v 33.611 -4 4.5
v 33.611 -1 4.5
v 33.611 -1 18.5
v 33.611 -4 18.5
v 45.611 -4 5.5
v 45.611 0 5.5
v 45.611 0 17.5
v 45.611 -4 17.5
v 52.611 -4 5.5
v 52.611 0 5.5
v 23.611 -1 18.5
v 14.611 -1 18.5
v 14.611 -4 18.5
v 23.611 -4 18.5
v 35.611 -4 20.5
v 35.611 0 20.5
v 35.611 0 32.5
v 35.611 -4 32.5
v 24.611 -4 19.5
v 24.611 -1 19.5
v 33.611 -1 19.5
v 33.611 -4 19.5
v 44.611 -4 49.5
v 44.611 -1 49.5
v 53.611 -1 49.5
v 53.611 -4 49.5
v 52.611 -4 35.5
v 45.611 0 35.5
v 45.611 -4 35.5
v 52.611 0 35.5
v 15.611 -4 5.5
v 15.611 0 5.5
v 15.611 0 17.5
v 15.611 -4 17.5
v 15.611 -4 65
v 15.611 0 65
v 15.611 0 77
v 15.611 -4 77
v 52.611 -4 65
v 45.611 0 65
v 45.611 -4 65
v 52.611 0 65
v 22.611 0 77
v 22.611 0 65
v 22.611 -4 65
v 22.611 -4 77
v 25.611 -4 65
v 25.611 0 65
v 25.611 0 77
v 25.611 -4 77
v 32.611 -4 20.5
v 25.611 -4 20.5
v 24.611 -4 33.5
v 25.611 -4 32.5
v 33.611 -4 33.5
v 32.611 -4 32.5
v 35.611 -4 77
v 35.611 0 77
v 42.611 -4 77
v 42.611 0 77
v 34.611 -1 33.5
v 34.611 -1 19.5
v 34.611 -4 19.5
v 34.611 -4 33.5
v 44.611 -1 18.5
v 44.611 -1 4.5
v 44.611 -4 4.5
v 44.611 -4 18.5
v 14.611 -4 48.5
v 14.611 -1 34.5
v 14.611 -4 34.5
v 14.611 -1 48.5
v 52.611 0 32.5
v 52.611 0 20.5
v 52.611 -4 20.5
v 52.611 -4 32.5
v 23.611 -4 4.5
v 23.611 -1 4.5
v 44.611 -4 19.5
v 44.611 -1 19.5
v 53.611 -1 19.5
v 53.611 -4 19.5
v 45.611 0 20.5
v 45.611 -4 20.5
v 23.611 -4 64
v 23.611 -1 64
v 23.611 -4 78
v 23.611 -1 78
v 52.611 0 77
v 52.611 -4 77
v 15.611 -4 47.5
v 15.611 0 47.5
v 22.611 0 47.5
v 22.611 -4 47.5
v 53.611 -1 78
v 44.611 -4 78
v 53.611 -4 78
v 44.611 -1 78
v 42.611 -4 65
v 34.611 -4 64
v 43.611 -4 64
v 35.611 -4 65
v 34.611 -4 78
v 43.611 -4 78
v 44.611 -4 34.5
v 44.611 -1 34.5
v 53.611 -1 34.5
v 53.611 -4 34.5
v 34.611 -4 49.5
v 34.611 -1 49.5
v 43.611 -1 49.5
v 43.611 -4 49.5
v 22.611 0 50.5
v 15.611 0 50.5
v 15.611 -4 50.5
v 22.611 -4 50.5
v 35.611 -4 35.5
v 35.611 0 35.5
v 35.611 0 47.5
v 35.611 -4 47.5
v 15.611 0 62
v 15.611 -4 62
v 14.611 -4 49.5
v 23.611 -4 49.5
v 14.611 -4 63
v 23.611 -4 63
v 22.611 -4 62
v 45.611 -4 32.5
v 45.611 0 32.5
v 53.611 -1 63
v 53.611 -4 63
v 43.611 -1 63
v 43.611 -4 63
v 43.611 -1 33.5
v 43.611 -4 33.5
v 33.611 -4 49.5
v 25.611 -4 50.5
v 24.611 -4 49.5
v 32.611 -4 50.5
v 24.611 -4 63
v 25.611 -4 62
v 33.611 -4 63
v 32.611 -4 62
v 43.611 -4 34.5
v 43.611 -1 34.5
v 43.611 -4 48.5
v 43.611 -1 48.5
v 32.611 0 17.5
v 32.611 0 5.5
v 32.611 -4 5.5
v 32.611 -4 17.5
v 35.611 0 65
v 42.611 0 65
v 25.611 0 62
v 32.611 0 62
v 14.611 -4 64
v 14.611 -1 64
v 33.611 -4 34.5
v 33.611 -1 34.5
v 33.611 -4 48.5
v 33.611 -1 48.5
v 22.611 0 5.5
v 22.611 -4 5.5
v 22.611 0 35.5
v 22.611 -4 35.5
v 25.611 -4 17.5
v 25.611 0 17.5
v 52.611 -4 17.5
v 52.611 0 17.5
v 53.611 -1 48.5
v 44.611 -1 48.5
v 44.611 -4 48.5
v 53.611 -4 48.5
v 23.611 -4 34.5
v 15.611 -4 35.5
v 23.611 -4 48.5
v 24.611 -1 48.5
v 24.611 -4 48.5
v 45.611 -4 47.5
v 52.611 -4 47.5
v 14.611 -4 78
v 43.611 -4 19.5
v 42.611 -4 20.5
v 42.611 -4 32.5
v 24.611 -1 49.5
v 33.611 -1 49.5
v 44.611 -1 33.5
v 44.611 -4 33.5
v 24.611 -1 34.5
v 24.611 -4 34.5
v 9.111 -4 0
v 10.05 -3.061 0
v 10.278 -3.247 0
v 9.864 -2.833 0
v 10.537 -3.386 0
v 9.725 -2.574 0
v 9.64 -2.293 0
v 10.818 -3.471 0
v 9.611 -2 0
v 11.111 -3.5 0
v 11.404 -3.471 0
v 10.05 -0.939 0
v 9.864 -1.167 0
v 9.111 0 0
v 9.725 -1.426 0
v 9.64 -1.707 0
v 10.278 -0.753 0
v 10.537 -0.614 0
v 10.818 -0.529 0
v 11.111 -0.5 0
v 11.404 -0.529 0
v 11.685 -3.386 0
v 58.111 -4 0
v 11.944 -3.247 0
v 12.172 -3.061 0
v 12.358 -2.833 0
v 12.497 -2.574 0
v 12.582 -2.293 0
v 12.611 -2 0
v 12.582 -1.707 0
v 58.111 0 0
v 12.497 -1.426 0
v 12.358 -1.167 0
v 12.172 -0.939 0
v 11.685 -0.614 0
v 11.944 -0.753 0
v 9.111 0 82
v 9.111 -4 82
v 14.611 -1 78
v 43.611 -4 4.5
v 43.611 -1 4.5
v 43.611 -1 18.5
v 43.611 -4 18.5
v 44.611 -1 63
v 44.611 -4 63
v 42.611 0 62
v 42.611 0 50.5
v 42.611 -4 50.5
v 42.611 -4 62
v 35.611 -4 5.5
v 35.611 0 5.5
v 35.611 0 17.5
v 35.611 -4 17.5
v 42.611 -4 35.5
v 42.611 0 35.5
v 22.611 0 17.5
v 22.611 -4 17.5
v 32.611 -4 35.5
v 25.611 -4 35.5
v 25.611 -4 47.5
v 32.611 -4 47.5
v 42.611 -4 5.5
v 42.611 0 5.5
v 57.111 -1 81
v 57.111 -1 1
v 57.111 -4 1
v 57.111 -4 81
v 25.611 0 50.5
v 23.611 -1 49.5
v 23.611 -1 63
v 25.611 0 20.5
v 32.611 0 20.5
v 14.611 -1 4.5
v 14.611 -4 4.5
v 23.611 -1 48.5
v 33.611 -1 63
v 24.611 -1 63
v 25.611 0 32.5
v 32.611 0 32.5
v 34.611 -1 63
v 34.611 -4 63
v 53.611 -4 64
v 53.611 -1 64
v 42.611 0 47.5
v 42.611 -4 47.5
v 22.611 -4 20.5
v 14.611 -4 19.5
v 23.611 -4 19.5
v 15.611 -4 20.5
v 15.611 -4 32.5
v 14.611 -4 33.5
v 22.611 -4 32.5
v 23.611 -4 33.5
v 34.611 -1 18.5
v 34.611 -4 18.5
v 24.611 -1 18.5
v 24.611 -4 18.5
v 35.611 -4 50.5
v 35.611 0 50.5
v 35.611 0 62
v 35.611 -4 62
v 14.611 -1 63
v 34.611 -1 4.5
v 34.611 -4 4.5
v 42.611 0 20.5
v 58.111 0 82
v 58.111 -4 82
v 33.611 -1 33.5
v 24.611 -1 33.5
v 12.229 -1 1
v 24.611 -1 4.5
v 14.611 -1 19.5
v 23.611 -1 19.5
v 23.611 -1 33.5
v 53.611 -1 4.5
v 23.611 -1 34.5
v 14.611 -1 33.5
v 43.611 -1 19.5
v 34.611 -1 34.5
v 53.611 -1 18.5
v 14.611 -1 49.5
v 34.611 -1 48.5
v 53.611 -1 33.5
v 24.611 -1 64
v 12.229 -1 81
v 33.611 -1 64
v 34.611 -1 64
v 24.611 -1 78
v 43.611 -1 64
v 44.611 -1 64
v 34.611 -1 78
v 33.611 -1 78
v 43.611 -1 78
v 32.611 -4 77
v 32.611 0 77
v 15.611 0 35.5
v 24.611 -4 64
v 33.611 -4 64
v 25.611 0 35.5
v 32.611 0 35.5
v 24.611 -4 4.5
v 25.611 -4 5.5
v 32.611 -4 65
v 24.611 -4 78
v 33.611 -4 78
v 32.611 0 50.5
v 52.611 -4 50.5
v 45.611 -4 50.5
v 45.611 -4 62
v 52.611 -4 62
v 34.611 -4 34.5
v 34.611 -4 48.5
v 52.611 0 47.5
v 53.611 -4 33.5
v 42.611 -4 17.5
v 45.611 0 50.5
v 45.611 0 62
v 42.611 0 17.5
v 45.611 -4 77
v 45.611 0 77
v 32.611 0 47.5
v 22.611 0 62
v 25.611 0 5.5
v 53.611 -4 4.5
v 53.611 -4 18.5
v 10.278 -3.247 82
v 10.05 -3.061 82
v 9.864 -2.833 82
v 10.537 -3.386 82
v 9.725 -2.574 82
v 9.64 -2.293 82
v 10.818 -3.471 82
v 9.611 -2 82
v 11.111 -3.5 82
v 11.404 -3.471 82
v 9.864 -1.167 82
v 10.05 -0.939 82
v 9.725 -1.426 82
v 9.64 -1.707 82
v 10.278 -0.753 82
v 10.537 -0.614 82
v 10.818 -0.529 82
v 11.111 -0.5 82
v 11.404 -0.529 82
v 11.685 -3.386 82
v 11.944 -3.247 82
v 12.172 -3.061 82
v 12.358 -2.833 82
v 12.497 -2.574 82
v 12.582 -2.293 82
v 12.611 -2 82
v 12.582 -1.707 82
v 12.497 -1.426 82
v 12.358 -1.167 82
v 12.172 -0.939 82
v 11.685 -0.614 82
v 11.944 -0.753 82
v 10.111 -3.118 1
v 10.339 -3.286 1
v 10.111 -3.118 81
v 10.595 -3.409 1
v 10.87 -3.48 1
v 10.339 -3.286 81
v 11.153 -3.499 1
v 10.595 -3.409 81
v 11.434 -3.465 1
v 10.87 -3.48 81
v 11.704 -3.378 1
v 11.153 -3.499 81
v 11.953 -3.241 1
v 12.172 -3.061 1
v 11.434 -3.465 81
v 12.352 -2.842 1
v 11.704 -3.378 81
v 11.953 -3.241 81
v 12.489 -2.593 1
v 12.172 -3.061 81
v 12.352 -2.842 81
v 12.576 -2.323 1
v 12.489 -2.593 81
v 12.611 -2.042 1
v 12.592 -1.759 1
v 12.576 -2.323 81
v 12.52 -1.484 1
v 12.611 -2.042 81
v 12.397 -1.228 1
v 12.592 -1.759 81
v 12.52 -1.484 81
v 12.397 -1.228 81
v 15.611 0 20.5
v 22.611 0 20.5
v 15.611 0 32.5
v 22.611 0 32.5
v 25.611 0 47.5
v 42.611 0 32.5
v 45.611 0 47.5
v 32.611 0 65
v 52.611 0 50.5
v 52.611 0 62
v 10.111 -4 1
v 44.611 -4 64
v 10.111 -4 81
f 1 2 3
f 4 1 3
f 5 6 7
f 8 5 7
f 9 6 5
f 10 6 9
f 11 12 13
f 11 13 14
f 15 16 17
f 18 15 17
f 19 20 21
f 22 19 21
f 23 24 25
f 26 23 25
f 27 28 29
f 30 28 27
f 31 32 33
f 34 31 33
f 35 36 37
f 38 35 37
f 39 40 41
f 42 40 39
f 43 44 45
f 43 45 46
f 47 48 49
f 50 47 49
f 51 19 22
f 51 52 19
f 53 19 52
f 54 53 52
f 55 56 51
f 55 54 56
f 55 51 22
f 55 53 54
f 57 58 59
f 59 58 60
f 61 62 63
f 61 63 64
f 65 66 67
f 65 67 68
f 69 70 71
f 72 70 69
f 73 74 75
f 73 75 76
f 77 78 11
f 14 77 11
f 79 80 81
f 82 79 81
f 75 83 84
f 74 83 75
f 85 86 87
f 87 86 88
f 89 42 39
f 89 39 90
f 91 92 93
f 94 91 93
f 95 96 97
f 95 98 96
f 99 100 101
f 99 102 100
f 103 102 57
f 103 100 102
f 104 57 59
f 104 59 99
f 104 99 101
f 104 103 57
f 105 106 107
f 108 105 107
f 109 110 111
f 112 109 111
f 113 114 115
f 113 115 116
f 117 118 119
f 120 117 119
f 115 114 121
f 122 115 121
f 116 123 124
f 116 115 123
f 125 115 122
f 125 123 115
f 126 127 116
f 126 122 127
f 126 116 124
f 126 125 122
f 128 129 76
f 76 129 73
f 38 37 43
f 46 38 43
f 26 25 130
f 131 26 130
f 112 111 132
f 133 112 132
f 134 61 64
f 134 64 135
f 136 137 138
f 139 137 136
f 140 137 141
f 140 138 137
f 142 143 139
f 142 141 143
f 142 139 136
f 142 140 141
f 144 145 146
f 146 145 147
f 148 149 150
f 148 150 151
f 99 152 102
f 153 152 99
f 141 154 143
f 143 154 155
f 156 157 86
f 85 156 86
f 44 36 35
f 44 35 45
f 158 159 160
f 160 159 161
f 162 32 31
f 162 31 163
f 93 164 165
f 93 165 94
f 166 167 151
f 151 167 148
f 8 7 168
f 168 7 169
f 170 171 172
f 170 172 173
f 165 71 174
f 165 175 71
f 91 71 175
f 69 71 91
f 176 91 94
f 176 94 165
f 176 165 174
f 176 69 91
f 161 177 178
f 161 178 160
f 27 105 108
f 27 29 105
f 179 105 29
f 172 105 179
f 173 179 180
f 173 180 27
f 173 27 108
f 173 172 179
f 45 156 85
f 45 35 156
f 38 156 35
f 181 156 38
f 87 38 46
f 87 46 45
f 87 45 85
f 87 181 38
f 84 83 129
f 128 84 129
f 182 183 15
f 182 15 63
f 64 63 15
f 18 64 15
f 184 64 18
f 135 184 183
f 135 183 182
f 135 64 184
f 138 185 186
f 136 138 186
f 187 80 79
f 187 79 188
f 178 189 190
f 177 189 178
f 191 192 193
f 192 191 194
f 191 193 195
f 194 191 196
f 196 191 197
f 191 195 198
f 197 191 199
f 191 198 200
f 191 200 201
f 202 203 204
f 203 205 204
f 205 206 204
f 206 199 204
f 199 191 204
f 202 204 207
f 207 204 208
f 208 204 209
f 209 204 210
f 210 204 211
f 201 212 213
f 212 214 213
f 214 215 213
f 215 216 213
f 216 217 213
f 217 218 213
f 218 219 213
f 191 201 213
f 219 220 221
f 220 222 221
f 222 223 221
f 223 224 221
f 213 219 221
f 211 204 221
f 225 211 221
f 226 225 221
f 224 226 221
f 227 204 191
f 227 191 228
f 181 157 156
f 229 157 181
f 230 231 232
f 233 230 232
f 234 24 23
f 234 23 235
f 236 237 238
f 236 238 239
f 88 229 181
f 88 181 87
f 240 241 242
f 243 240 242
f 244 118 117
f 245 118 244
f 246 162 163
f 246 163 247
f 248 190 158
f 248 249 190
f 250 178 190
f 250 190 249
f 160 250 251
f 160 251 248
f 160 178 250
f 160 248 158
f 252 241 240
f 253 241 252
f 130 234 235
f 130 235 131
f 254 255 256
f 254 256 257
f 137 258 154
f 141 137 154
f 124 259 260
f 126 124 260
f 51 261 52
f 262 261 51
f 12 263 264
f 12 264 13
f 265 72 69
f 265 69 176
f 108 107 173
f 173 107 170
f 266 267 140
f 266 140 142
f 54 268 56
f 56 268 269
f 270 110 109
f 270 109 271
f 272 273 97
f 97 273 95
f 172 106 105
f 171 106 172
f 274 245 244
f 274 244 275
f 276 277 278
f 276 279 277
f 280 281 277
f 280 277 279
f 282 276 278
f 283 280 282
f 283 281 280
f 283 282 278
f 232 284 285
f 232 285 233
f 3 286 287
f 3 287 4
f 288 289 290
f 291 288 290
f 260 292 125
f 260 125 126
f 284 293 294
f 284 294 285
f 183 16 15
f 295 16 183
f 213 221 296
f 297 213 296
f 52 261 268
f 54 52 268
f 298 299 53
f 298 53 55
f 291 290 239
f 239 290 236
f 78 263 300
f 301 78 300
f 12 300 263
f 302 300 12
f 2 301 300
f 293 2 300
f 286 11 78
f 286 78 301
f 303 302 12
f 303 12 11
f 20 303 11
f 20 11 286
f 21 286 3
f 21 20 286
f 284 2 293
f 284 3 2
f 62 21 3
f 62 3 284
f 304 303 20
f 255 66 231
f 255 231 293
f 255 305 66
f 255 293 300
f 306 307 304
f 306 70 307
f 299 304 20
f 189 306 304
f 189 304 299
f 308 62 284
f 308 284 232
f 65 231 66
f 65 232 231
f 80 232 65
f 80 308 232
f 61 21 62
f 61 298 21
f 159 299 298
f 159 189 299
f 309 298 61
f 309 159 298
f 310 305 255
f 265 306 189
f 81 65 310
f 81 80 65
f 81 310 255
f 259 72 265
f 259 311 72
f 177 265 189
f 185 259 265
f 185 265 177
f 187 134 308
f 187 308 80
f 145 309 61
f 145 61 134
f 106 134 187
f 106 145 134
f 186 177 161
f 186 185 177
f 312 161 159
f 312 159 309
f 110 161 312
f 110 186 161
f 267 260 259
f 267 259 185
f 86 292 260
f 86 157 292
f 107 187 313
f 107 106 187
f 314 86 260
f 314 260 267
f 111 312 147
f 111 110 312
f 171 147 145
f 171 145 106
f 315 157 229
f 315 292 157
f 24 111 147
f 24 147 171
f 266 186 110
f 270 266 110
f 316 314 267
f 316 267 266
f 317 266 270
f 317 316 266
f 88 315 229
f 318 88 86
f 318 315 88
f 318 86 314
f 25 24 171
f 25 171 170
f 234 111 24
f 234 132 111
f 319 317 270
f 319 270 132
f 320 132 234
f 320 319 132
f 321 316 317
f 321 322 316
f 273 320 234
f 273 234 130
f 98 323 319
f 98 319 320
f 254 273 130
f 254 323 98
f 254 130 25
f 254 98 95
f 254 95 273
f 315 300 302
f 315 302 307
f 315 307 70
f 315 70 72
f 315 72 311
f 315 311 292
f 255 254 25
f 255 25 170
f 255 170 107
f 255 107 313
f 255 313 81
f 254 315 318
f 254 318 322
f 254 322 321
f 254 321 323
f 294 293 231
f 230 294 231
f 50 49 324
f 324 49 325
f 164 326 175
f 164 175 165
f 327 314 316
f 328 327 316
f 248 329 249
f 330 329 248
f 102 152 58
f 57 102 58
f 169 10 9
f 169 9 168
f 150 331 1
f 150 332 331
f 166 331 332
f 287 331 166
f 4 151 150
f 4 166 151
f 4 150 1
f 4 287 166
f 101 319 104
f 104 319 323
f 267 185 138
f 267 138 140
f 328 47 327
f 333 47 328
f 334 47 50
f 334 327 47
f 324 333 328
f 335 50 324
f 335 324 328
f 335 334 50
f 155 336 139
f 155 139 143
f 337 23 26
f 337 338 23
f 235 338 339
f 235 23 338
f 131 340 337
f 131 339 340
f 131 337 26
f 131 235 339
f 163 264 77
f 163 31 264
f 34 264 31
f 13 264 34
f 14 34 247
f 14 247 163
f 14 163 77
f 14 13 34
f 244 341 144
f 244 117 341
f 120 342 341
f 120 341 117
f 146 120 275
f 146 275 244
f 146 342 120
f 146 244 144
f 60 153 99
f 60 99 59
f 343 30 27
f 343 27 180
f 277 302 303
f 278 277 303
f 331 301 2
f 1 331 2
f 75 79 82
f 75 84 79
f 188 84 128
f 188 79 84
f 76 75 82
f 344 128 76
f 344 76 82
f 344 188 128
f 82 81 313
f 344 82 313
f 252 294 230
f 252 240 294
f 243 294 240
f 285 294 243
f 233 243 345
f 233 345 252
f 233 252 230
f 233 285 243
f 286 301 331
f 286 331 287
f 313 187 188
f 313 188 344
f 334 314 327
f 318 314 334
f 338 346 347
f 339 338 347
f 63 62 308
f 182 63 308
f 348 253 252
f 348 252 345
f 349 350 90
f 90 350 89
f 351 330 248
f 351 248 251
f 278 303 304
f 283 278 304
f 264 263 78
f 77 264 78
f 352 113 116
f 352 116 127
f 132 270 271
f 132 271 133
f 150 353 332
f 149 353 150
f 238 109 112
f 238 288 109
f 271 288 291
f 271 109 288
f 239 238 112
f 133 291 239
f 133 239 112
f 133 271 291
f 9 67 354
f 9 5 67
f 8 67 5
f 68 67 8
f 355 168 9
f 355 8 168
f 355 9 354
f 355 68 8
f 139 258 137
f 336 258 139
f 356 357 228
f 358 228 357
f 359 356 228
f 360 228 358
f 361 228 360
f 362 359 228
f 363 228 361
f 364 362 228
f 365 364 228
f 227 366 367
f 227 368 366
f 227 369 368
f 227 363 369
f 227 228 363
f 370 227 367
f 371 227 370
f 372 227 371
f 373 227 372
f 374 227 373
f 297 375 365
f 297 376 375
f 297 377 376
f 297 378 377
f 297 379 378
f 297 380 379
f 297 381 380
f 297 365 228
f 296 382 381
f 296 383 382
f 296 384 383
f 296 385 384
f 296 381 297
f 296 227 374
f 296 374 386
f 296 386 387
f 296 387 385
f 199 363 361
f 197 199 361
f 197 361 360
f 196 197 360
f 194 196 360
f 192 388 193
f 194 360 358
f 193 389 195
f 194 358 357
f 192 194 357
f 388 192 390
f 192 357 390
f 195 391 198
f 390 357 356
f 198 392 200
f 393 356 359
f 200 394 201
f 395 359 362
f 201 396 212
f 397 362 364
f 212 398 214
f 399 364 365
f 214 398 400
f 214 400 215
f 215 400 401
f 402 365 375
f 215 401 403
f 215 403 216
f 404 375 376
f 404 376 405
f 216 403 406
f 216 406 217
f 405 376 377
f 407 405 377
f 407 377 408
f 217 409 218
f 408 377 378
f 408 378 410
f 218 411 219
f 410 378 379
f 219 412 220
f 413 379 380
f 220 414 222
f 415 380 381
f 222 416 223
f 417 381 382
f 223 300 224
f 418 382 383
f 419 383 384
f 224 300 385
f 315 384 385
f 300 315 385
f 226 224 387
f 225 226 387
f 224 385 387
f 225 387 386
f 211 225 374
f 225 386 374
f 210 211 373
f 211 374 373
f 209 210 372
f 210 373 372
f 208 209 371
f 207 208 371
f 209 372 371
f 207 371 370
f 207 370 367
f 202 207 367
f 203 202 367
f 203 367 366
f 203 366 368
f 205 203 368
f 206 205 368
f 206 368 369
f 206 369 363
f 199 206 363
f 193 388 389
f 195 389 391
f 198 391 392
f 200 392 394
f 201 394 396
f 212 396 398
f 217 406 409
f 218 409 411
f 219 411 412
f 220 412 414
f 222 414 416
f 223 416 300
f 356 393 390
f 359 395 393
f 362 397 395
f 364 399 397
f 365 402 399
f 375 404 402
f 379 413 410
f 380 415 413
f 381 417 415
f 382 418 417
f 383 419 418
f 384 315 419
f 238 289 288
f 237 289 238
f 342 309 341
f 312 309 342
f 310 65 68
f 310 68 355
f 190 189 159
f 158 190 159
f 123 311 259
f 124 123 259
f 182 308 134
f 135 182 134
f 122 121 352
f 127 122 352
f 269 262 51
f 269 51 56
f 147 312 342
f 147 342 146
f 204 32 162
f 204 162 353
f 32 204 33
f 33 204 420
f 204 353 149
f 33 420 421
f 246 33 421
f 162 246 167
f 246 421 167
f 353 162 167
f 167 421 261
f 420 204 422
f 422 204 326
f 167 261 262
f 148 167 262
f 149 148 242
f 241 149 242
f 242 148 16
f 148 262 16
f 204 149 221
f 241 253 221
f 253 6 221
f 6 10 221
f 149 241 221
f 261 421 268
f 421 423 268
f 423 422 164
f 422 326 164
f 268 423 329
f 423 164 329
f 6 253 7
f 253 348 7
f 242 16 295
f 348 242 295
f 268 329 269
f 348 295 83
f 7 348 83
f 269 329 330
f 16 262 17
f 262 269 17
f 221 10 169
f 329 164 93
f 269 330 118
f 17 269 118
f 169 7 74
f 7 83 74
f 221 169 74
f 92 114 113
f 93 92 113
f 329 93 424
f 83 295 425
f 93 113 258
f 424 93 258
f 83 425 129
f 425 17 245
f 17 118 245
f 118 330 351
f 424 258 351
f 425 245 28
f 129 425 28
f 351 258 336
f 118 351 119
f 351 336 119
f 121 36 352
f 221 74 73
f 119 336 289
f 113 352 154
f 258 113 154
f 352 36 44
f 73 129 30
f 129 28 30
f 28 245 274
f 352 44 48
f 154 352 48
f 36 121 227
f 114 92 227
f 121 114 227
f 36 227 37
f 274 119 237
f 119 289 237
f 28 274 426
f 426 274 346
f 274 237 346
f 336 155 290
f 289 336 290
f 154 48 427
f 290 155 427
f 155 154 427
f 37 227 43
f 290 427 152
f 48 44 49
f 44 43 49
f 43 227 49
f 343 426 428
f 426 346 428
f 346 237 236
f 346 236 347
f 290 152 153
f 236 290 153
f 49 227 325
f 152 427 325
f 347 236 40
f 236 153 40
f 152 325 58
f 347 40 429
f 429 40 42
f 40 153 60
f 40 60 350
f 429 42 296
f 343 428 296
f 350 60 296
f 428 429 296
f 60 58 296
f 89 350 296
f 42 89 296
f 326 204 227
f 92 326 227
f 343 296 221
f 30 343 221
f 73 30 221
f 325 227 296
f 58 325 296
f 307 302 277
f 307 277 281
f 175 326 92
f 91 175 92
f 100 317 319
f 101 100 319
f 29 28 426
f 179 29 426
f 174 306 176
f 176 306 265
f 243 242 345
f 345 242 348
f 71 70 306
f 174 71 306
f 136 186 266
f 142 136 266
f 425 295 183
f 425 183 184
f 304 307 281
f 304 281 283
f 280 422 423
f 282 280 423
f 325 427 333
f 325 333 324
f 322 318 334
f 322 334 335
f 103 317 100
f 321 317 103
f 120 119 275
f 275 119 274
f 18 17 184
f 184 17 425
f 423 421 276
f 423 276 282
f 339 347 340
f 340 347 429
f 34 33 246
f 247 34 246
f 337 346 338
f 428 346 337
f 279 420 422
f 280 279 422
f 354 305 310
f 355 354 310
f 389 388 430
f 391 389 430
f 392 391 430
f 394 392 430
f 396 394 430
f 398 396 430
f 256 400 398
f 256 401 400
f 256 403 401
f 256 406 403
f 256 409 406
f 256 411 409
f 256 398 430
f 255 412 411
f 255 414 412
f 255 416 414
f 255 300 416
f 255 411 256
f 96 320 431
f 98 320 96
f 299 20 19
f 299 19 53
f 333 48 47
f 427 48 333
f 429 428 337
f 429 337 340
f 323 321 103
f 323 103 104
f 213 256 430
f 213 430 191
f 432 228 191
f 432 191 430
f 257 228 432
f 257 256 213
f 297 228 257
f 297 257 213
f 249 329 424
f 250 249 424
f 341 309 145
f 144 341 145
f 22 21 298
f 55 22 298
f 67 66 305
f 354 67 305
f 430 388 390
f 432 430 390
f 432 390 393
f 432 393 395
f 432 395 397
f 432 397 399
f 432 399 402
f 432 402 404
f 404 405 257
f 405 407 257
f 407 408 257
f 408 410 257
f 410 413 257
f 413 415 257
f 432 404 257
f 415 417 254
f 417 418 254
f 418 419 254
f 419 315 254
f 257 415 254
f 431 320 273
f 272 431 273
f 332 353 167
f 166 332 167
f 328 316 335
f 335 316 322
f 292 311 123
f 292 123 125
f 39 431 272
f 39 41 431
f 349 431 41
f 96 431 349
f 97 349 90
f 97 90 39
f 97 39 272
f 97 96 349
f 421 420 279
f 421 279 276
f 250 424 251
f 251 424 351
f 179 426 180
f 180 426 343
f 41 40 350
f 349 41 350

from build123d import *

# Parameters (mm, degrees)
F0_W     = 49
F0_H     = 82
F0_W_2   = 40
F0_H_2   = 74
F0_W_3   = 7
F0_H_3   = 12
F0_H_4   = 11.5
F1_DEPTH = 4
F2_T     = -1
F4_D     = 3


# Not quite as in the source:
# - a feature names something its author has since deleted; it is built from what else it names


with BuildPart() as f1:
    # F0 (on Front) → F1 (new body)
    with BuildSketch(Plane.XZ):
        with Locations((33.611113002, 41)):
            Rectangle(F0_W, F0_H)
        with Locations((34.111113002, 41)):
            Rectangle(F0_W_2, F0_H_2, mode=Mode.SUBTRACT)
        with Locations((34.111113002, 41)):
            Rectangle(F0_W_2, F0_H_2)
        with Locations((19.111113002, 11.5)):
            Rectangle(F0_W_3, F0_H_3, mode=Mode.SUBTRACT)
        with Locations((29.111113002, 11.5)):
            Rectangle(F0_W_3, F0_H_3, mode=Mode.SUBTRACT)
        with Locations((19.111113002, 26.5)):
            Rectangle(F0_W_3, F0_H_3, mode=Mode.SUBTRACT)
        with Locations((29.111113002, 26.5)):
            Rectangle(F0_W_3, F0_H_3, mode=Mode.SUBTRACT)
        with Locations((39.111113002, 11.5)):
            Rectangle(F0_W_3, F0_H_3, mode=Mode.SUBTRACT)
        with Locations((49.111113002, 11.5)):
            Rectangle(F0_W_3, F0_H_3, mode=Mode.SUBTRACT)
        with Locations((39.111113002, 26.5)):
            Rectangle(F0_W_3, F0_H_3, mode=Mode.SUBTRACT)
        with Locations((49.111113002, 26.5)):
            Rectangle(F0_W_3, F0_H_3, mode=Mode.SUBTRACT)
        with Locations((19.111113002, 41.5)):
            Rectangle(F0_W_3, F0_H_3, mode=Mode.SUBTRACT)
        with Locations((19.111113002, 56.25)):
            Rectangle(F0_W_3, F0_H_4, mode=Mode.SUBTRACT)
        with Locations((29.111113002, 41.5)):
            Rectangle(F0_W_3, F0_H_3, mode=Mode.SUBTRACT)
        with Locations((29.111113002, 56.25)):
            Rectangle(F0_W_3, F0_H_4, mode=Mode.SUBTRACT)
        with Locations((19.111113002, 71)):
            Rectangle(F0_W_3, F0_H_3, mode=Mode.SUBTRACT)
        with Locations((29.111113002, 71)):
            Rectangle(F0_W_3, F0_H_3, mode=Mode.SUBTRACT)
        with Locations((39.111113002, 41.5)):
            Rectangle(F0_W_3, F0_H_3, mode=Mode.SUBTRACT)
        with Locations((39.111113002, 56.25)):
            Rectangle(F0_W_3, F0_H_4, mode=Mode.SUBTRACT)
        with Locations((49.111113002, 41.5)):
            Rectangle(F0_W_3, F0_H_3, mode=Mode.SUBTRACT)
        with Locations((49.111113002, 56.25)):
            Rectangle(F0_W_3, F0_H_4, mode=Mode.SUBTRACT)
        with Locations((39.111113002, 71)):
            Rectangle(F0_W_3, F0_H_3, mode=Mode.SUBTRACT)
        with Locations((49.111113002, 71)):
            Rectangle(F0_W_3, F0_H_3, mode=Mode.SUBTRACT)
    extrude(amount=F1_DEPTH)

    # F2
    f2_openings = [f1.faces().sort_by_distance(p)[0] for p in [
        (33.256946, -4, 40.840774),
    ]]
    offset(amount=F2_T, openings=f2_openings, kind=Kind.INTERSECTION)

    # F4 (through all)
    with Locations(Plane(origin=(0, 0, 0), x_dir=(1, 0, 0), z_dir=(0, 0, -1))):
        with Locations((11.111113002, 2)):
            Hole(F4_D / 2)


solid = f1.part
